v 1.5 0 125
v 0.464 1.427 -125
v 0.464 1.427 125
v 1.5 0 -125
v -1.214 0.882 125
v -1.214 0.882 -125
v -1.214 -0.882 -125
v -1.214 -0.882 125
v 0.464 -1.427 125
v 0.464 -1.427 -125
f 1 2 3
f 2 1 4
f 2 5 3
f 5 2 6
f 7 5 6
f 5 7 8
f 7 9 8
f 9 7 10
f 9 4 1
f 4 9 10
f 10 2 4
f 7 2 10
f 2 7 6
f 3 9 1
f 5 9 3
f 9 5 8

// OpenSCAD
// file: ../conf.scad
//rendering
epsilon=0.1;

//model
frame_length=1000;
frame_inner=13.5;
frame_outer=15;

support_width=100;
support_height=0.75;
support_inner=90;
support_diameter=3;

rack_width=150;
rack_inner=140;
rack_diameter=3;
rack_height=250;
rack_plate_height=4;

stand_height=250;
stand_width=282;
stand_diameter=6;
stand_head_height=35;
stand_head_diameter=4;

foot_outer=12;
foot_inner=8;
foot_length=500;

motor_hole_distance=480;
motor_hole_diameter=12;
motor_mount_distance=19;
motor_mount_diameter=3;
// main file
include <../conf.scad>

module rack_mount() {

color("grey")
cylinder(rack_height, d=rack_diameter, center=true);

}

rack_mount();
